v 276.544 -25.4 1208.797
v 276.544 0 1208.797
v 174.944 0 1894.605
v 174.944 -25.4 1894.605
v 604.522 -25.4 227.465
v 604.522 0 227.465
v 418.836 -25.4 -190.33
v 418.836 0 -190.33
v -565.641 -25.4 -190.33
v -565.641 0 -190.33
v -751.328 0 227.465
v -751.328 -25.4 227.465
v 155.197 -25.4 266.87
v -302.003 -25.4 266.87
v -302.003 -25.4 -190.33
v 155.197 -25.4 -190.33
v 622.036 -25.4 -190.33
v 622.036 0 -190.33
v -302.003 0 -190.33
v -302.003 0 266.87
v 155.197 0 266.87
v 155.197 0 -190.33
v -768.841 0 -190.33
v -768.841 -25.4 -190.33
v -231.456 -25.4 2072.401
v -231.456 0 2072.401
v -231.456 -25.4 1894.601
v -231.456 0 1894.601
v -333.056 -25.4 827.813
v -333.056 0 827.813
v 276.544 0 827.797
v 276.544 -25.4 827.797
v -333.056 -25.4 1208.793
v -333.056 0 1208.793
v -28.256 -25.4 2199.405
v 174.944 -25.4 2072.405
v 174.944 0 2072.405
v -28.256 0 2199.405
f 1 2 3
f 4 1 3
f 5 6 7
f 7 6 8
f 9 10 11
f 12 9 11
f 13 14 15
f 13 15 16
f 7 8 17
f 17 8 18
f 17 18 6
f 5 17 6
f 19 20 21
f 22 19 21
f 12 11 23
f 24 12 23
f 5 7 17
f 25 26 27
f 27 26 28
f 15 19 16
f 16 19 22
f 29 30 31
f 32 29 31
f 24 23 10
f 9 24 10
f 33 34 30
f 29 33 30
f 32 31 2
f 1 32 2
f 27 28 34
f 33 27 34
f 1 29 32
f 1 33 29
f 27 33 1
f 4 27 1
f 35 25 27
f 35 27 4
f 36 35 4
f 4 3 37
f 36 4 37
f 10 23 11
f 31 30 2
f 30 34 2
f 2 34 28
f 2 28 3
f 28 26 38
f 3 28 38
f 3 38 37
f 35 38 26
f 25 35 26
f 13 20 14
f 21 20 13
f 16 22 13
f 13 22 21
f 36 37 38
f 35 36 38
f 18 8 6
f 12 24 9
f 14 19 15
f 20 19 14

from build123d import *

# Parameters (mm, degrees)
F0_W     = 457.2
F0_H     = 457.2
F1_DEPTH = 25.4


# Not quite as in the source:
# - ends of sketch curves that miss each other by under 0.0002 mm in the source are joined


with BuildPart() as f1:
    # F0 (on Front) → F1 (new body)
    with BuildSketch(Plane.XZ):
        with Locations((-73.4027251601, 38.2703000127)):
            Rectangle(F0_W, F0_H)
    extrude(amount=F1_DEPTH)


with BuildPart() as f1b:
    # F0 (on Front) → F1, piece 2 (new body)
    with BuildSketch(Plane.XZ):
        Polygon((-768.841027844, -190.3296999873), (-565.641027844, -190.3296999873), (-751.3275345236, 227.4649400419), align=None)
    extrude(amount=F1_DEPTH)


with BuildPart() as f1c:
    # F0 (on Front) → F1, piece 3 (new body)
    with BuildSketch(Plane.XZ):
        Polygon((604.5220842033, 227.4649400419), (418.8355775237, -190.3296999873), (622.0355775237, -190.3296999873), align=None)
    extrude(amount=F1_DEPTH)


with BuildPart() as f1d:
    # F0 (on Front) → F1, piece 4 (new body)
    with BuildSketch(Plane.XZ):
        Polygon((-333.0557037953, 827.8134502805), (276.5442959808, 827.7969272853), (276.5442959808, 1208.7969272853), (174.944296007, 1894.604935298), (174.944296007, 2072.404935298), (-28.2561103925, 2199.4051892978), (-231.455703993, 2072.4009312714), (-231.455703993, 1894.6009312714), (-333.0557040787, 1208.7929232587), align=None)
    extrude(amount=F1_DEPTH)


solid = Compound([f1.part, f1b.part, f1c.part, f1d.part])
